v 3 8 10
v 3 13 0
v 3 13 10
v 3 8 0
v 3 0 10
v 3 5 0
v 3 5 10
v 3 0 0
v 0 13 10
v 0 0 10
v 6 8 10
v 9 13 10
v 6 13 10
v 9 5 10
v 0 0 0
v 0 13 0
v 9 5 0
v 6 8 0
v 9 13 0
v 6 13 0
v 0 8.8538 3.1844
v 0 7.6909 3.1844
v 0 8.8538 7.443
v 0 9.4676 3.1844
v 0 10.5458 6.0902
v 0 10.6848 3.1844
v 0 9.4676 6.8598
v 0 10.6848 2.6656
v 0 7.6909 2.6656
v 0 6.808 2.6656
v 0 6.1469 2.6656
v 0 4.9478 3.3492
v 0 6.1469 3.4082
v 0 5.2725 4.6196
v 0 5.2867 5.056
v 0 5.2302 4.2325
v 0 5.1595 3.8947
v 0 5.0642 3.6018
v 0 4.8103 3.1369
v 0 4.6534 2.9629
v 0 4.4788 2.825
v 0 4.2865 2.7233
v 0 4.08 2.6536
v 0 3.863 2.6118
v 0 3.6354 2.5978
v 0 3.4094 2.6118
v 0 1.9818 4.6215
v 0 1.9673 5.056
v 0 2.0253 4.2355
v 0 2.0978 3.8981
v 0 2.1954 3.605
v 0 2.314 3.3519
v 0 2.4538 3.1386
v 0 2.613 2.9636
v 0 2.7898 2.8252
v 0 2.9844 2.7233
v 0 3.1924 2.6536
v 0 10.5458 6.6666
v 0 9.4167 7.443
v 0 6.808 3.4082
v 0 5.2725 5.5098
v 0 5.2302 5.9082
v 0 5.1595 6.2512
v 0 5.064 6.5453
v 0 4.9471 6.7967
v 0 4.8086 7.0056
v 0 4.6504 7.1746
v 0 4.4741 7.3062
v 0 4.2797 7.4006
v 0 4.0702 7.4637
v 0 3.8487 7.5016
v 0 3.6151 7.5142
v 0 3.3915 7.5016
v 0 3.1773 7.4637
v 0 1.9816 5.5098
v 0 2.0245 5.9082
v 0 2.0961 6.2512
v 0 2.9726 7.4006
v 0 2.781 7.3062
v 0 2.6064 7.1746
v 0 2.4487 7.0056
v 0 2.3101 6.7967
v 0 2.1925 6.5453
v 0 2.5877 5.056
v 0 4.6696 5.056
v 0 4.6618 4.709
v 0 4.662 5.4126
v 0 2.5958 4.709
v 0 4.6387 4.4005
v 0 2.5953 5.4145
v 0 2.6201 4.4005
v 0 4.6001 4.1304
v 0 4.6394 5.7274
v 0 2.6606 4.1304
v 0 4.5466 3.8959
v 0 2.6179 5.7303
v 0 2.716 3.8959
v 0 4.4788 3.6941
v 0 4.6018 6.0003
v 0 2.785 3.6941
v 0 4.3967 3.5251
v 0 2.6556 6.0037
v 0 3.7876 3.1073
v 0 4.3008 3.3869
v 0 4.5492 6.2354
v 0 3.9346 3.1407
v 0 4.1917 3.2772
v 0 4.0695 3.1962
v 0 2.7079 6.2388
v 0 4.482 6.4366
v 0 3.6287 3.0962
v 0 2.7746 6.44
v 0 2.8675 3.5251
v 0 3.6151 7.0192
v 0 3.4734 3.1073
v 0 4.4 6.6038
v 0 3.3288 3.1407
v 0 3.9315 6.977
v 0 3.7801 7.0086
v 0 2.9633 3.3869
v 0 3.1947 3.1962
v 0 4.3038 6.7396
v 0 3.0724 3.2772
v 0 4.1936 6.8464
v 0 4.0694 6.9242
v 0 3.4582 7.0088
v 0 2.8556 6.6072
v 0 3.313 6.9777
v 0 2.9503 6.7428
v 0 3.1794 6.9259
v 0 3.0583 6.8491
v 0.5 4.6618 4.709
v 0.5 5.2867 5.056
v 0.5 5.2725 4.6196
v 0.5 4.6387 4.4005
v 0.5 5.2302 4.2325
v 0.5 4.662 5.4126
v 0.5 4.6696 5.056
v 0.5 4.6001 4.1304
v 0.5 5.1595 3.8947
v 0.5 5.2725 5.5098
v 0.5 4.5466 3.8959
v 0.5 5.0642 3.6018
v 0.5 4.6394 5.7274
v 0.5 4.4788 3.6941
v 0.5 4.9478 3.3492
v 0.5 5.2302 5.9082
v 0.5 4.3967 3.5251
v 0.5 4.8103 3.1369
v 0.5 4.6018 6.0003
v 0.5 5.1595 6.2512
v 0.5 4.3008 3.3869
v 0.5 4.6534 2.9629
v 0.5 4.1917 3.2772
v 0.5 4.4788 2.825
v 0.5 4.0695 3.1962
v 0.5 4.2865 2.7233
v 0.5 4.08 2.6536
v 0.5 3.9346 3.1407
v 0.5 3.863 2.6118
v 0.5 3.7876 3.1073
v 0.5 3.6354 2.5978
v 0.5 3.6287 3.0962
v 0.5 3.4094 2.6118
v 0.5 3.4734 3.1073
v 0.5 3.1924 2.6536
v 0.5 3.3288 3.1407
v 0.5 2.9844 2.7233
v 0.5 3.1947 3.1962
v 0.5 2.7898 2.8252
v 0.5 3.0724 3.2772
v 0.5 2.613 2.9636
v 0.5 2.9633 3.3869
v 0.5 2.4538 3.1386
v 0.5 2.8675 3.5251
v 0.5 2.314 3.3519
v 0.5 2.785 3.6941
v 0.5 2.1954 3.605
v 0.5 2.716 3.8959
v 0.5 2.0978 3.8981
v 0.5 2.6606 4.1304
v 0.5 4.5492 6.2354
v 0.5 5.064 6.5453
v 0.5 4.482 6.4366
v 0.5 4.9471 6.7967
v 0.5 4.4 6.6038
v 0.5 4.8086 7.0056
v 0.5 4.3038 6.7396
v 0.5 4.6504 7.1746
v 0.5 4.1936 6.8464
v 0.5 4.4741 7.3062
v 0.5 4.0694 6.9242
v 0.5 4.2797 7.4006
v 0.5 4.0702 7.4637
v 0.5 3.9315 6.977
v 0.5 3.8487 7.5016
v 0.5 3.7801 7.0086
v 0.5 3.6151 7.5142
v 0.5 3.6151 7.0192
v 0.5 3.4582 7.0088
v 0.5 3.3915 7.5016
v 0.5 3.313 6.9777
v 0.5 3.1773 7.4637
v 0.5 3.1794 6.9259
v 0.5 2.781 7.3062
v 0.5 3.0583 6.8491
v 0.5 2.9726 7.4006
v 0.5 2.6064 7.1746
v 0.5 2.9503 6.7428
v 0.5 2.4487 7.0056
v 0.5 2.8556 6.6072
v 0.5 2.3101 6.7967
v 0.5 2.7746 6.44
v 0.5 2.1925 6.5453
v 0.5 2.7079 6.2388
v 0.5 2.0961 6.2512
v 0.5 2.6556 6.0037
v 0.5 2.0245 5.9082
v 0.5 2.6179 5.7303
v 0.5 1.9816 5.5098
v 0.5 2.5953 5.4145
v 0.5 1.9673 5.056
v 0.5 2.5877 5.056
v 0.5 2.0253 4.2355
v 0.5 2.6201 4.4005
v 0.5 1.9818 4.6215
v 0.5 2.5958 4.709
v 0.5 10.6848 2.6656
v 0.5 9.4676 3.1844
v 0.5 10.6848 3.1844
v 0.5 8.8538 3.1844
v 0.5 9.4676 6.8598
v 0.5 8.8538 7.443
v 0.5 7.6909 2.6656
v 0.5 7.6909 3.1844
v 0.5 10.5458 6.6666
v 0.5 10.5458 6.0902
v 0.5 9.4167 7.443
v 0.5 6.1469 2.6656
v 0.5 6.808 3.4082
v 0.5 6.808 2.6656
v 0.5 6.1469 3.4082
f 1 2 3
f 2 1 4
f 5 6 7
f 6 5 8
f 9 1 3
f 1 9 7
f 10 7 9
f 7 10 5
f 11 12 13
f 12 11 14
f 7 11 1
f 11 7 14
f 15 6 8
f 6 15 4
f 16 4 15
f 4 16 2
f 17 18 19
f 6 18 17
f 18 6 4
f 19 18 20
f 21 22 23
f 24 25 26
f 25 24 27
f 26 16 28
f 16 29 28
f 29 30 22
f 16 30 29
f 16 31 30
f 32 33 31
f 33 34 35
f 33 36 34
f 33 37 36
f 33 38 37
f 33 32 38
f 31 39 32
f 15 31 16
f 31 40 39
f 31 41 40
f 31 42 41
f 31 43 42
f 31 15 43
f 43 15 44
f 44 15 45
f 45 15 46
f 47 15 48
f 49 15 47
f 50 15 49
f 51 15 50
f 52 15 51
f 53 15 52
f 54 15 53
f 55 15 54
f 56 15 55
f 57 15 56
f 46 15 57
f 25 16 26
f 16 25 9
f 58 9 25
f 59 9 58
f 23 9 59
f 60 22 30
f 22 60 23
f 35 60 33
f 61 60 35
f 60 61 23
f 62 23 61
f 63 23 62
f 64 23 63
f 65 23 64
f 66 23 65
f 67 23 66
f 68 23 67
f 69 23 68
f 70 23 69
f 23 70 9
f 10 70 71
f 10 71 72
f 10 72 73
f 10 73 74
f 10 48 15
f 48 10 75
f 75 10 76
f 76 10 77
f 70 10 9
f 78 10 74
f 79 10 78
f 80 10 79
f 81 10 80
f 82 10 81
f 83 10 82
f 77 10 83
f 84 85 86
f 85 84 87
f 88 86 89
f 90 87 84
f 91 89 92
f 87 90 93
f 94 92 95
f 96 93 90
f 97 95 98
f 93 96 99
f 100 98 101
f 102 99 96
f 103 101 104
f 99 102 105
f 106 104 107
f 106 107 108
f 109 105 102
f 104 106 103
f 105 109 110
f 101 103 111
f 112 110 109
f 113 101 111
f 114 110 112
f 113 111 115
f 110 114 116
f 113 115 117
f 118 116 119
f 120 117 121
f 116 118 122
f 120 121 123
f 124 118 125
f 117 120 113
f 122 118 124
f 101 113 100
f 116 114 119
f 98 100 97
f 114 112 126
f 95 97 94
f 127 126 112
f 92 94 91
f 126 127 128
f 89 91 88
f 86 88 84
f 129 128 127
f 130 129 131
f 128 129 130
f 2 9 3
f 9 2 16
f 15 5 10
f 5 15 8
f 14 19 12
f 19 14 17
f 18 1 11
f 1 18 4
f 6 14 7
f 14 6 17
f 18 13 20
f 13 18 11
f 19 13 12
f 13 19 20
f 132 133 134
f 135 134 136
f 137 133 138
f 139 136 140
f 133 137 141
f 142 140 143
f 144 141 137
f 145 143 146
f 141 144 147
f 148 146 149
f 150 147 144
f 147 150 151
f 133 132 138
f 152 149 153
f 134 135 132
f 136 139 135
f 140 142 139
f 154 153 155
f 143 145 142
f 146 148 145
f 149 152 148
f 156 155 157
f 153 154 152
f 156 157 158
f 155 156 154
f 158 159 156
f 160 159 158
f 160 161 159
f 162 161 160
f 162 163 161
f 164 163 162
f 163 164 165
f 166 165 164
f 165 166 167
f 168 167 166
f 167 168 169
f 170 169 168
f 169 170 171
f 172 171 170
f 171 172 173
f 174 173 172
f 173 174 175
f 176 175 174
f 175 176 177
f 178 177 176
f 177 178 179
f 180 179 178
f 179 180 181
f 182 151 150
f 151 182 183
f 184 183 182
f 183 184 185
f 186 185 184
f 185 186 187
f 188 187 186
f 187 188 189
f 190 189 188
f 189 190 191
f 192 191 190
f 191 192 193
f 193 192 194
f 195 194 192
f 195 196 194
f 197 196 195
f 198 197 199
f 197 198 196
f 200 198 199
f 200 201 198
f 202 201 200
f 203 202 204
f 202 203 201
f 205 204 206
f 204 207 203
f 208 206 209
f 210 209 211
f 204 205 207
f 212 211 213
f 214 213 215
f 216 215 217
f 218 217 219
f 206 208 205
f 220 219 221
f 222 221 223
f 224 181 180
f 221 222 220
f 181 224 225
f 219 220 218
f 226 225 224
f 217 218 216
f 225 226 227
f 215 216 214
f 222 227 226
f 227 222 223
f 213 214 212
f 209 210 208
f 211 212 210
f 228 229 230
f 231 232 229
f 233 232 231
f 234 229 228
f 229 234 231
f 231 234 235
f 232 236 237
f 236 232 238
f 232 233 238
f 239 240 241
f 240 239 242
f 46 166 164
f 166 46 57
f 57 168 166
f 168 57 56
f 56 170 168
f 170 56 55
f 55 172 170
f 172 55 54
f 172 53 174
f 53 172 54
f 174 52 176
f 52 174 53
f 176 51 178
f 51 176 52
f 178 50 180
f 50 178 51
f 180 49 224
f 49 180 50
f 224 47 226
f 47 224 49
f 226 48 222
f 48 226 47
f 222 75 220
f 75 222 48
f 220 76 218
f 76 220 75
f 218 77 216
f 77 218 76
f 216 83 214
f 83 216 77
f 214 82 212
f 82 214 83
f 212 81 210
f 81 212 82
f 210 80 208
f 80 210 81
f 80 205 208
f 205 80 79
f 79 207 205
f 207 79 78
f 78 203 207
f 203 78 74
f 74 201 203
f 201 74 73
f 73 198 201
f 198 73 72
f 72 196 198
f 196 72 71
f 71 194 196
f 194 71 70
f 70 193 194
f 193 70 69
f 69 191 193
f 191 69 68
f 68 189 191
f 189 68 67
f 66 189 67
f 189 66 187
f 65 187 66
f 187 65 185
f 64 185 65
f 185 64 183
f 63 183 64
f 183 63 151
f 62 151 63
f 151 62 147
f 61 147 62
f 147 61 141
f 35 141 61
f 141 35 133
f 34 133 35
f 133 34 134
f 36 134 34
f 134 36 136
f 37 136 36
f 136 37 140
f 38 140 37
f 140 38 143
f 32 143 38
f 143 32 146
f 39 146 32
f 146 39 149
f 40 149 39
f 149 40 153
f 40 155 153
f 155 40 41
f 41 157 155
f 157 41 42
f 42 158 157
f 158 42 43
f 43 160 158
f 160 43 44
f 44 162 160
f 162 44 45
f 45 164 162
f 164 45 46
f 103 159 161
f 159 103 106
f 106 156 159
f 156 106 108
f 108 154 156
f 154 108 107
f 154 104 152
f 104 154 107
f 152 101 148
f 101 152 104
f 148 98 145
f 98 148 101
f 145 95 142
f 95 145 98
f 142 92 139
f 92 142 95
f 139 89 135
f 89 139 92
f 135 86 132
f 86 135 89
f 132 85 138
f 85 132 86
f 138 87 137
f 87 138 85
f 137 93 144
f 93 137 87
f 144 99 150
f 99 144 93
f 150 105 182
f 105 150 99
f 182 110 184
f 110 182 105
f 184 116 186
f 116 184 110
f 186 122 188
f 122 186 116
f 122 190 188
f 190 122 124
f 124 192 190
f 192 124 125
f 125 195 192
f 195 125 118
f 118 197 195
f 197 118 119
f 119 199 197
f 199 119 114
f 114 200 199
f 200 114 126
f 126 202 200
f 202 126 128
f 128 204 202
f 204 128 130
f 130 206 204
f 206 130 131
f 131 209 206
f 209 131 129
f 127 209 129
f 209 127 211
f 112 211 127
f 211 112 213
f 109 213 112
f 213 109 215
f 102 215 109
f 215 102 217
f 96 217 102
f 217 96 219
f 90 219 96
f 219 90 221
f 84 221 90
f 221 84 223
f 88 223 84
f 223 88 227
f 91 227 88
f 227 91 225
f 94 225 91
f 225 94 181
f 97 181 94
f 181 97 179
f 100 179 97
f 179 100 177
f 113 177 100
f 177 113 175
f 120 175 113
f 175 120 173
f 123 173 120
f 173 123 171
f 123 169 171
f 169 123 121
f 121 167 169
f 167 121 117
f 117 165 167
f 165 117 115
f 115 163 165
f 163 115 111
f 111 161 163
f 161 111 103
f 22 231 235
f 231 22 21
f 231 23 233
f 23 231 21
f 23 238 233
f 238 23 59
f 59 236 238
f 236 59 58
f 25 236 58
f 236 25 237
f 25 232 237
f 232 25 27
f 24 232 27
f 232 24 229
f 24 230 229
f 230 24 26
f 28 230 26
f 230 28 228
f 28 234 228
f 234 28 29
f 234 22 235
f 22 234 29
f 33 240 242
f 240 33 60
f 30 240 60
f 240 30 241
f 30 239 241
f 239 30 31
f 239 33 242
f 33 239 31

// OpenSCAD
width = 5; // x
layerThickness = 3; // y
depth = layerThickness * 3; // 

height = 10;

fingerLength = 5;

overallLength = 2 * fingerLength + layerThickness;

difference() {
    union() {
        // spine
        cube ([layerThickness, overallLength, height]); 
        
        // offset
        translate ([0, fingerLength, 0])
            cube ([depth, layerThickness, height]);
        
        // finger
        translate ([layerThickness * 2, fingerLength, 0])
            cube ([layerThickness, fingerLength + layerThickness, height]);
    }

    versionNumber();
}



version = "1.0";

module versionNumber() {
    translate([0.5, overallLength/2,height/2])
    rotate([90,0,-90])
    linear_extrude (1) {
    text(version, , 5, halign = "center", valign = "center");
    }
}
